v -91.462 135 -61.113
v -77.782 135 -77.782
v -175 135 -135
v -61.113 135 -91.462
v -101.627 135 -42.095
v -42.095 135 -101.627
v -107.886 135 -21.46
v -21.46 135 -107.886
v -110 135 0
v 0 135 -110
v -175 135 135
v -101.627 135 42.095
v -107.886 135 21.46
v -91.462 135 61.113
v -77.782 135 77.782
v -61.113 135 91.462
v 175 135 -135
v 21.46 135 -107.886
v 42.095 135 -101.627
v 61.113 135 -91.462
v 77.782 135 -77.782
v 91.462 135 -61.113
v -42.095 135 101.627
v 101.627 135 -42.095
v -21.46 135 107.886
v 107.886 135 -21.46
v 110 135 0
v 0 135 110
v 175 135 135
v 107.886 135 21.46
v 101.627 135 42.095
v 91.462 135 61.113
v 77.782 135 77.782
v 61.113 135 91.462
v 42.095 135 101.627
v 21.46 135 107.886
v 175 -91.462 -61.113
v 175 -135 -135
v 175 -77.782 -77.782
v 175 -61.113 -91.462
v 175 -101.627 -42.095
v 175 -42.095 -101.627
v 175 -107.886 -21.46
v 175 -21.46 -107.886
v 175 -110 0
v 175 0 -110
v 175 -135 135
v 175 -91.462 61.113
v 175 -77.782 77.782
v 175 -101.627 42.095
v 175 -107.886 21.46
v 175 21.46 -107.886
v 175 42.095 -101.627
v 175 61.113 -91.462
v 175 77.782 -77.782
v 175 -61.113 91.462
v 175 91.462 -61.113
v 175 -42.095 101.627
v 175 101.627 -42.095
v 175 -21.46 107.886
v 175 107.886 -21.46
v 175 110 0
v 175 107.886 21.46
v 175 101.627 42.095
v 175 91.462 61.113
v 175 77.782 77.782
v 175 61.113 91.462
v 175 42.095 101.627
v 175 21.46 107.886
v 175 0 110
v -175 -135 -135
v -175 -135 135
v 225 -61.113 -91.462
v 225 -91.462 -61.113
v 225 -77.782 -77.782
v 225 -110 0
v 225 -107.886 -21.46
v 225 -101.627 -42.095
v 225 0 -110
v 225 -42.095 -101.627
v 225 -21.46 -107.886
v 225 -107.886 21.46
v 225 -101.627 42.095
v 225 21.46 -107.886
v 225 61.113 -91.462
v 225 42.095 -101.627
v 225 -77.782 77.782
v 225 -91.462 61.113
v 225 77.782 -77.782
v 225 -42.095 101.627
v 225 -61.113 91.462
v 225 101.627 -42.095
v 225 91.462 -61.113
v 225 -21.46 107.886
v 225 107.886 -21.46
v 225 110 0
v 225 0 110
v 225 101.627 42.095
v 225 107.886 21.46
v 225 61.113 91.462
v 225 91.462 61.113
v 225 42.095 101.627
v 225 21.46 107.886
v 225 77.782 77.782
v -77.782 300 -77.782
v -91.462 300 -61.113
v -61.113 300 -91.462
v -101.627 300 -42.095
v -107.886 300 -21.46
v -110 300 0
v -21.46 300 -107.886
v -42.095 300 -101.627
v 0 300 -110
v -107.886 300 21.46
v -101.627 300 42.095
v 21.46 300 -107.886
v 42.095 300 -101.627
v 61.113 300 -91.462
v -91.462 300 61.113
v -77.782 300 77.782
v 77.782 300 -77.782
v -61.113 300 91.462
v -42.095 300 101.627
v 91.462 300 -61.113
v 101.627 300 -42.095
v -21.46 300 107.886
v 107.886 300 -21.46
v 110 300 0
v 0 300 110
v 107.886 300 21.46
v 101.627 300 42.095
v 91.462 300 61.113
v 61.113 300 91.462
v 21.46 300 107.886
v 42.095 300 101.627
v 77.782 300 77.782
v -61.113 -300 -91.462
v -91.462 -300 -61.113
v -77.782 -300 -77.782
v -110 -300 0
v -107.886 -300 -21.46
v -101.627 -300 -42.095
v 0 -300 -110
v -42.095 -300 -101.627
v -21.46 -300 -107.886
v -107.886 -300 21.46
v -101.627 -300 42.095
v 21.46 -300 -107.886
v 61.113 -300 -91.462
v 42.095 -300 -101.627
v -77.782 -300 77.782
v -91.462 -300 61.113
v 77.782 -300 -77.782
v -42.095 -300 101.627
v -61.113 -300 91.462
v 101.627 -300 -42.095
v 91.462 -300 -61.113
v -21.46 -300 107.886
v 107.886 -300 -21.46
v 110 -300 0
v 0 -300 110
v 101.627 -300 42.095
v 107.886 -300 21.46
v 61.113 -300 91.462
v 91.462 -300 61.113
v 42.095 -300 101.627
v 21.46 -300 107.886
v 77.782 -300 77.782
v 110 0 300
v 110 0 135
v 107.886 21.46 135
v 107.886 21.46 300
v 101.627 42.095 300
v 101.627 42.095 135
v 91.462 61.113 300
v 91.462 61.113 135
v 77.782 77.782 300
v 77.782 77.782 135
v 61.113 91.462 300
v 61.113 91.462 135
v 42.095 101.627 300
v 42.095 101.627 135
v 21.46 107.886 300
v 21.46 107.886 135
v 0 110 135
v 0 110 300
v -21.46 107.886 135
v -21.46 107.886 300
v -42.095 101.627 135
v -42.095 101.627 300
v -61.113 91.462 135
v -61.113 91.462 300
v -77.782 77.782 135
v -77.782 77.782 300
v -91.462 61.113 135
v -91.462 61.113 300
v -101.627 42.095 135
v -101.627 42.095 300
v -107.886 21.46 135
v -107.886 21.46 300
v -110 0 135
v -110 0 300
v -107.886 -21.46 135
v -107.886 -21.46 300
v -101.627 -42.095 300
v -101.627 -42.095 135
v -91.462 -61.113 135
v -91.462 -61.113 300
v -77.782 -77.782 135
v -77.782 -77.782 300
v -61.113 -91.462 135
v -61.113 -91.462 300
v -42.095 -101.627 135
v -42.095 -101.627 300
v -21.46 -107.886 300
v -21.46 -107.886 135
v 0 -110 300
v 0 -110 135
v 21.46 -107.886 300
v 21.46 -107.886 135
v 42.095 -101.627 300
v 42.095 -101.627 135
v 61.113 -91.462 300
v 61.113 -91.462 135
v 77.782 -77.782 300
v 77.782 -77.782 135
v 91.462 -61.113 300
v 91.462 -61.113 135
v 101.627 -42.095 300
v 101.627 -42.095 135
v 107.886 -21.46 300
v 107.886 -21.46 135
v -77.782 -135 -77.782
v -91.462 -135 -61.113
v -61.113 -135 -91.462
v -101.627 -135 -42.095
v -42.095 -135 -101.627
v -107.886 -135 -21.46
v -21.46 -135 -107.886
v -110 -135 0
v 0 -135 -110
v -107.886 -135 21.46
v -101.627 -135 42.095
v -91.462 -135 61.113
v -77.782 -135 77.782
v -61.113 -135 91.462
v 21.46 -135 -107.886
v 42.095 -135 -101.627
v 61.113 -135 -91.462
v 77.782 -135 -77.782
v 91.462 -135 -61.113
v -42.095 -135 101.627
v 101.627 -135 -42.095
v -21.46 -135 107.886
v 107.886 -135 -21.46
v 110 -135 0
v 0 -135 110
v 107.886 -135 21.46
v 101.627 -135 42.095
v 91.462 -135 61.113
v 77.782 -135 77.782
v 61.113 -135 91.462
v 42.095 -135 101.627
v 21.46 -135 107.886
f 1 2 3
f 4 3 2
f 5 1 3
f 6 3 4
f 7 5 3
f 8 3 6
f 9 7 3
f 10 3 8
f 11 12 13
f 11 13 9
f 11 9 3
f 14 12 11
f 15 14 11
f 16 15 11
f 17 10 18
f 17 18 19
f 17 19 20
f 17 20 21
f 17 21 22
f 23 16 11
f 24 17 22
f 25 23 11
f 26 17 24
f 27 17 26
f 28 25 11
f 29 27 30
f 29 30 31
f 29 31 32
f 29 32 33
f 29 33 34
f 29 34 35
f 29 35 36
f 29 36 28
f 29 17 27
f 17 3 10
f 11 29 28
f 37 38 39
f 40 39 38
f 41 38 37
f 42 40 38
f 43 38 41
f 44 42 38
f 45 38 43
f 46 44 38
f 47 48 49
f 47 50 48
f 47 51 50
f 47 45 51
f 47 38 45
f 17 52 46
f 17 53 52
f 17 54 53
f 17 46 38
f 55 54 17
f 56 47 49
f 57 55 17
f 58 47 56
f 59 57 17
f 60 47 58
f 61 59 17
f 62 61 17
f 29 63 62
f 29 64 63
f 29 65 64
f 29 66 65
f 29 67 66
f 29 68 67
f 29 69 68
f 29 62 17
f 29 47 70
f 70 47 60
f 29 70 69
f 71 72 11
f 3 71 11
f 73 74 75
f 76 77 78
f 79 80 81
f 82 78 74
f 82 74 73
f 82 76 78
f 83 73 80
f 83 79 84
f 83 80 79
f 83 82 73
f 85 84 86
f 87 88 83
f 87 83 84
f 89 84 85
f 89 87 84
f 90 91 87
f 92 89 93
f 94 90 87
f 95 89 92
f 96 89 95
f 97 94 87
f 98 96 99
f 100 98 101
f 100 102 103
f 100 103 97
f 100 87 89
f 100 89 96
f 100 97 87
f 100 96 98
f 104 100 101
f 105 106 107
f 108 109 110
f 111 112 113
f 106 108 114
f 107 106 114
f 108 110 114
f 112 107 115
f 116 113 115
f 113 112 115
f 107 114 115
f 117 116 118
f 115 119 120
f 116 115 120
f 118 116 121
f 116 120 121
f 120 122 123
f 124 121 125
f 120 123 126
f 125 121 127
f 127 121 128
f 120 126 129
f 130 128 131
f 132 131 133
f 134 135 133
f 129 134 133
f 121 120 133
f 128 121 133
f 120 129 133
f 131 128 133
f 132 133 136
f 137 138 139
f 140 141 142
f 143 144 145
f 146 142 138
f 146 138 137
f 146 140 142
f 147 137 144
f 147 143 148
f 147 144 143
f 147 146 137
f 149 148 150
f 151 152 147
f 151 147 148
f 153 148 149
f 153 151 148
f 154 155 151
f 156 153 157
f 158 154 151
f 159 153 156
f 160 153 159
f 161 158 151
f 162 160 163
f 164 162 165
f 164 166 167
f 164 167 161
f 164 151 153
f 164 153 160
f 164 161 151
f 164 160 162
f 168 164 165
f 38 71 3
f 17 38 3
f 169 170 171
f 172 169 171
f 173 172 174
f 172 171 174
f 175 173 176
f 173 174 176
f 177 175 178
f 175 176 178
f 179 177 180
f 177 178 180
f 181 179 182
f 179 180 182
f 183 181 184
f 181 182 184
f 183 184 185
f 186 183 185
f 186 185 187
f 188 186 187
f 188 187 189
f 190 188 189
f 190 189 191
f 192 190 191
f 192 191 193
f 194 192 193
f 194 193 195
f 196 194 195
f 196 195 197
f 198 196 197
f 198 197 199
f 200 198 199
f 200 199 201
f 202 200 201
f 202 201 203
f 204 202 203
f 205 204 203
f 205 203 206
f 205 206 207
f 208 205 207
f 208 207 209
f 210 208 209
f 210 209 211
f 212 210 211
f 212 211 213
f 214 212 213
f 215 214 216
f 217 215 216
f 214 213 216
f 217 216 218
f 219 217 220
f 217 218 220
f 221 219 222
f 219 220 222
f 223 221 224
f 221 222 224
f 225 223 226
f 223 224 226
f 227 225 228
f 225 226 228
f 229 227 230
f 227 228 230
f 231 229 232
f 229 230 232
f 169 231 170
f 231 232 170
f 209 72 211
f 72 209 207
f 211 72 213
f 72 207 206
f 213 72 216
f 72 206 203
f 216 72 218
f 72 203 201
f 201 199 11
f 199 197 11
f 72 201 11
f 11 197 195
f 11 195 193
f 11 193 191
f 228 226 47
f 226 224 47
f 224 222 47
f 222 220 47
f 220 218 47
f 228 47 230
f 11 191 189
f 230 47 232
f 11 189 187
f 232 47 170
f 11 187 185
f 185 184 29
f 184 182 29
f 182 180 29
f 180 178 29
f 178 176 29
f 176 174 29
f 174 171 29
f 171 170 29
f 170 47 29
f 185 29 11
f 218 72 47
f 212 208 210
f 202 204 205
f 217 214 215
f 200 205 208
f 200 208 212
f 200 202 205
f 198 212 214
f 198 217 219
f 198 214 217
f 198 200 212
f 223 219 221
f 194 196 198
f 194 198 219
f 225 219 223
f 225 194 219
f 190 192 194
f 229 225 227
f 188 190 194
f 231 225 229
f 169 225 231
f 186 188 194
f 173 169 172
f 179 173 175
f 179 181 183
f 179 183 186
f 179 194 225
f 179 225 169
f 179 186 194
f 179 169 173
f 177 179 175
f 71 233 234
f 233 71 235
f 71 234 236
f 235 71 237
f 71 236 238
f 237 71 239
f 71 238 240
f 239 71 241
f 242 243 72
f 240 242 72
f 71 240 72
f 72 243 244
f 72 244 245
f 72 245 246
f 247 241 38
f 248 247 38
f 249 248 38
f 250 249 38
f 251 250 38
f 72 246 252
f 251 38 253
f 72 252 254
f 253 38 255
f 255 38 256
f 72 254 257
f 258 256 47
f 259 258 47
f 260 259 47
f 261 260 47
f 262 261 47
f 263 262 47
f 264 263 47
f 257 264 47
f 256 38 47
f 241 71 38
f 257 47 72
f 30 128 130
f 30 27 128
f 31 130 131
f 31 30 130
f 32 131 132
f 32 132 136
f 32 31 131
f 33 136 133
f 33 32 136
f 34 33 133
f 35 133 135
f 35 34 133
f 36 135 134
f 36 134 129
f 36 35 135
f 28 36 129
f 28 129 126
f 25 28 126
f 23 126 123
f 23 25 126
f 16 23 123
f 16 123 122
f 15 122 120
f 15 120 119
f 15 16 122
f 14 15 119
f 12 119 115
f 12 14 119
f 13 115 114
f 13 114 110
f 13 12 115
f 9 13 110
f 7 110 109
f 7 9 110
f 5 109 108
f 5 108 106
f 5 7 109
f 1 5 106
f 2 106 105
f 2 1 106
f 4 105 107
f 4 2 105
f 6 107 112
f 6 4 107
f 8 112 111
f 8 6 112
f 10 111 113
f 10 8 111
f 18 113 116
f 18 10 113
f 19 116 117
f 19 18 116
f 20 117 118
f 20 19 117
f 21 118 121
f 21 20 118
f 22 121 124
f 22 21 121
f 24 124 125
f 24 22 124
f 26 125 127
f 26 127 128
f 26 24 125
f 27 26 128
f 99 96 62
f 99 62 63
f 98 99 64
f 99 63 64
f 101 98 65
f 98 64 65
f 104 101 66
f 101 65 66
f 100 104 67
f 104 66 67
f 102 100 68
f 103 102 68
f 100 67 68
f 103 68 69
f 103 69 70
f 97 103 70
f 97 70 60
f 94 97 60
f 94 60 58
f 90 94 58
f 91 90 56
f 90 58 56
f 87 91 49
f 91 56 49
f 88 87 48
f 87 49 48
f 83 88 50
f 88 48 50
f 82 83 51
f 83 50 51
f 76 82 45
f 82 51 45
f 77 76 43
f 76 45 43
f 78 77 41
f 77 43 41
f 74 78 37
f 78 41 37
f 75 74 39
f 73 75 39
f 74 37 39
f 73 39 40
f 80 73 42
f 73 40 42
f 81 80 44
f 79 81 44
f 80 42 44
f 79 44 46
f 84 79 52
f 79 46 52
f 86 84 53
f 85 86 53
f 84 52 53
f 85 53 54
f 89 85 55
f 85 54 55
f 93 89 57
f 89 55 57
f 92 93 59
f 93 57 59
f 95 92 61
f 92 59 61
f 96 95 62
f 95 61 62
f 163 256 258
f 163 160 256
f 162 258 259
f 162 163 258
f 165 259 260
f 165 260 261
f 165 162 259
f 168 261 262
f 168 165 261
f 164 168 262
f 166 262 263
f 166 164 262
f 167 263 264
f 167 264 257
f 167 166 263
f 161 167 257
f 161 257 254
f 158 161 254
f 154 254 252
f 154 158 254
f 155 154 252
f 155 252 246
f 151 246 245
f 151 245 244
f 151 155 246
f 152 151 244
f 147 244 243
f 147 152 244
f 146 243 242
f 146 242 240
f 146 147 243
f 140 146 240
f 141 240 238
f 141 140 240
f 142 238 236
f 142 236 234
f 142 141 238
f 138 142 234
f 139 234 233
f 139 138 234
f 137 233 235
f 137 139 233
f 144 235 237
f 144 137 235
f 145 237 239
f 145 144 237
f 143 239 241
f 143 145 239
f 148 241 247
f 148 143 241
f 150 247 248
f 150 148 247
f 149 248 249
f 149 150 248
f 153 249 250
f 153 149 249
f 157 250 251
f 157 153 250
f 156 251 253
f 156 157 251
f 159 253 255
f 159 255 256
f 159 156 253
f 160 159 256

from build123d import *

# Parameters (mm, degrees)
F0_R     = 110
F1_DEPTH = 300
F2_R     = 110
F3_DEPTH = 300
F4_W     = 270
F4_H     = 270
F5_DEPTH = 175
F6_R     = 110
F7_DEPTH = 50


with BuildPart() as f1:
    # F0 (on Front) → F1 (new body, symmetric)
    with BuildSketch(Plane.XZ):
        Circle(F0_R)
    extrude(amount=F1_DEPTH, both=True)

    # F2 (on Top) → F3 (join)
    with BuildSketch(Plane.XY):
        Circle(F2_R)
    extrude(amount=F3_DEPTH)

    # F4 (on Right) → F5 (join, symmetric)
    with BuildSketch(Plane.YZ):
        Rectangle(F4_W, F4_H)
    extrude(amount=F5_DEPTH, both=True)

    # F6 (on face) → F7 (join)
    with BuildSketch(Plane.YZ.offset(175)):
        Circle(F6_R)
    extrude(amount=F7_DEPTH)


solid = f1.part
